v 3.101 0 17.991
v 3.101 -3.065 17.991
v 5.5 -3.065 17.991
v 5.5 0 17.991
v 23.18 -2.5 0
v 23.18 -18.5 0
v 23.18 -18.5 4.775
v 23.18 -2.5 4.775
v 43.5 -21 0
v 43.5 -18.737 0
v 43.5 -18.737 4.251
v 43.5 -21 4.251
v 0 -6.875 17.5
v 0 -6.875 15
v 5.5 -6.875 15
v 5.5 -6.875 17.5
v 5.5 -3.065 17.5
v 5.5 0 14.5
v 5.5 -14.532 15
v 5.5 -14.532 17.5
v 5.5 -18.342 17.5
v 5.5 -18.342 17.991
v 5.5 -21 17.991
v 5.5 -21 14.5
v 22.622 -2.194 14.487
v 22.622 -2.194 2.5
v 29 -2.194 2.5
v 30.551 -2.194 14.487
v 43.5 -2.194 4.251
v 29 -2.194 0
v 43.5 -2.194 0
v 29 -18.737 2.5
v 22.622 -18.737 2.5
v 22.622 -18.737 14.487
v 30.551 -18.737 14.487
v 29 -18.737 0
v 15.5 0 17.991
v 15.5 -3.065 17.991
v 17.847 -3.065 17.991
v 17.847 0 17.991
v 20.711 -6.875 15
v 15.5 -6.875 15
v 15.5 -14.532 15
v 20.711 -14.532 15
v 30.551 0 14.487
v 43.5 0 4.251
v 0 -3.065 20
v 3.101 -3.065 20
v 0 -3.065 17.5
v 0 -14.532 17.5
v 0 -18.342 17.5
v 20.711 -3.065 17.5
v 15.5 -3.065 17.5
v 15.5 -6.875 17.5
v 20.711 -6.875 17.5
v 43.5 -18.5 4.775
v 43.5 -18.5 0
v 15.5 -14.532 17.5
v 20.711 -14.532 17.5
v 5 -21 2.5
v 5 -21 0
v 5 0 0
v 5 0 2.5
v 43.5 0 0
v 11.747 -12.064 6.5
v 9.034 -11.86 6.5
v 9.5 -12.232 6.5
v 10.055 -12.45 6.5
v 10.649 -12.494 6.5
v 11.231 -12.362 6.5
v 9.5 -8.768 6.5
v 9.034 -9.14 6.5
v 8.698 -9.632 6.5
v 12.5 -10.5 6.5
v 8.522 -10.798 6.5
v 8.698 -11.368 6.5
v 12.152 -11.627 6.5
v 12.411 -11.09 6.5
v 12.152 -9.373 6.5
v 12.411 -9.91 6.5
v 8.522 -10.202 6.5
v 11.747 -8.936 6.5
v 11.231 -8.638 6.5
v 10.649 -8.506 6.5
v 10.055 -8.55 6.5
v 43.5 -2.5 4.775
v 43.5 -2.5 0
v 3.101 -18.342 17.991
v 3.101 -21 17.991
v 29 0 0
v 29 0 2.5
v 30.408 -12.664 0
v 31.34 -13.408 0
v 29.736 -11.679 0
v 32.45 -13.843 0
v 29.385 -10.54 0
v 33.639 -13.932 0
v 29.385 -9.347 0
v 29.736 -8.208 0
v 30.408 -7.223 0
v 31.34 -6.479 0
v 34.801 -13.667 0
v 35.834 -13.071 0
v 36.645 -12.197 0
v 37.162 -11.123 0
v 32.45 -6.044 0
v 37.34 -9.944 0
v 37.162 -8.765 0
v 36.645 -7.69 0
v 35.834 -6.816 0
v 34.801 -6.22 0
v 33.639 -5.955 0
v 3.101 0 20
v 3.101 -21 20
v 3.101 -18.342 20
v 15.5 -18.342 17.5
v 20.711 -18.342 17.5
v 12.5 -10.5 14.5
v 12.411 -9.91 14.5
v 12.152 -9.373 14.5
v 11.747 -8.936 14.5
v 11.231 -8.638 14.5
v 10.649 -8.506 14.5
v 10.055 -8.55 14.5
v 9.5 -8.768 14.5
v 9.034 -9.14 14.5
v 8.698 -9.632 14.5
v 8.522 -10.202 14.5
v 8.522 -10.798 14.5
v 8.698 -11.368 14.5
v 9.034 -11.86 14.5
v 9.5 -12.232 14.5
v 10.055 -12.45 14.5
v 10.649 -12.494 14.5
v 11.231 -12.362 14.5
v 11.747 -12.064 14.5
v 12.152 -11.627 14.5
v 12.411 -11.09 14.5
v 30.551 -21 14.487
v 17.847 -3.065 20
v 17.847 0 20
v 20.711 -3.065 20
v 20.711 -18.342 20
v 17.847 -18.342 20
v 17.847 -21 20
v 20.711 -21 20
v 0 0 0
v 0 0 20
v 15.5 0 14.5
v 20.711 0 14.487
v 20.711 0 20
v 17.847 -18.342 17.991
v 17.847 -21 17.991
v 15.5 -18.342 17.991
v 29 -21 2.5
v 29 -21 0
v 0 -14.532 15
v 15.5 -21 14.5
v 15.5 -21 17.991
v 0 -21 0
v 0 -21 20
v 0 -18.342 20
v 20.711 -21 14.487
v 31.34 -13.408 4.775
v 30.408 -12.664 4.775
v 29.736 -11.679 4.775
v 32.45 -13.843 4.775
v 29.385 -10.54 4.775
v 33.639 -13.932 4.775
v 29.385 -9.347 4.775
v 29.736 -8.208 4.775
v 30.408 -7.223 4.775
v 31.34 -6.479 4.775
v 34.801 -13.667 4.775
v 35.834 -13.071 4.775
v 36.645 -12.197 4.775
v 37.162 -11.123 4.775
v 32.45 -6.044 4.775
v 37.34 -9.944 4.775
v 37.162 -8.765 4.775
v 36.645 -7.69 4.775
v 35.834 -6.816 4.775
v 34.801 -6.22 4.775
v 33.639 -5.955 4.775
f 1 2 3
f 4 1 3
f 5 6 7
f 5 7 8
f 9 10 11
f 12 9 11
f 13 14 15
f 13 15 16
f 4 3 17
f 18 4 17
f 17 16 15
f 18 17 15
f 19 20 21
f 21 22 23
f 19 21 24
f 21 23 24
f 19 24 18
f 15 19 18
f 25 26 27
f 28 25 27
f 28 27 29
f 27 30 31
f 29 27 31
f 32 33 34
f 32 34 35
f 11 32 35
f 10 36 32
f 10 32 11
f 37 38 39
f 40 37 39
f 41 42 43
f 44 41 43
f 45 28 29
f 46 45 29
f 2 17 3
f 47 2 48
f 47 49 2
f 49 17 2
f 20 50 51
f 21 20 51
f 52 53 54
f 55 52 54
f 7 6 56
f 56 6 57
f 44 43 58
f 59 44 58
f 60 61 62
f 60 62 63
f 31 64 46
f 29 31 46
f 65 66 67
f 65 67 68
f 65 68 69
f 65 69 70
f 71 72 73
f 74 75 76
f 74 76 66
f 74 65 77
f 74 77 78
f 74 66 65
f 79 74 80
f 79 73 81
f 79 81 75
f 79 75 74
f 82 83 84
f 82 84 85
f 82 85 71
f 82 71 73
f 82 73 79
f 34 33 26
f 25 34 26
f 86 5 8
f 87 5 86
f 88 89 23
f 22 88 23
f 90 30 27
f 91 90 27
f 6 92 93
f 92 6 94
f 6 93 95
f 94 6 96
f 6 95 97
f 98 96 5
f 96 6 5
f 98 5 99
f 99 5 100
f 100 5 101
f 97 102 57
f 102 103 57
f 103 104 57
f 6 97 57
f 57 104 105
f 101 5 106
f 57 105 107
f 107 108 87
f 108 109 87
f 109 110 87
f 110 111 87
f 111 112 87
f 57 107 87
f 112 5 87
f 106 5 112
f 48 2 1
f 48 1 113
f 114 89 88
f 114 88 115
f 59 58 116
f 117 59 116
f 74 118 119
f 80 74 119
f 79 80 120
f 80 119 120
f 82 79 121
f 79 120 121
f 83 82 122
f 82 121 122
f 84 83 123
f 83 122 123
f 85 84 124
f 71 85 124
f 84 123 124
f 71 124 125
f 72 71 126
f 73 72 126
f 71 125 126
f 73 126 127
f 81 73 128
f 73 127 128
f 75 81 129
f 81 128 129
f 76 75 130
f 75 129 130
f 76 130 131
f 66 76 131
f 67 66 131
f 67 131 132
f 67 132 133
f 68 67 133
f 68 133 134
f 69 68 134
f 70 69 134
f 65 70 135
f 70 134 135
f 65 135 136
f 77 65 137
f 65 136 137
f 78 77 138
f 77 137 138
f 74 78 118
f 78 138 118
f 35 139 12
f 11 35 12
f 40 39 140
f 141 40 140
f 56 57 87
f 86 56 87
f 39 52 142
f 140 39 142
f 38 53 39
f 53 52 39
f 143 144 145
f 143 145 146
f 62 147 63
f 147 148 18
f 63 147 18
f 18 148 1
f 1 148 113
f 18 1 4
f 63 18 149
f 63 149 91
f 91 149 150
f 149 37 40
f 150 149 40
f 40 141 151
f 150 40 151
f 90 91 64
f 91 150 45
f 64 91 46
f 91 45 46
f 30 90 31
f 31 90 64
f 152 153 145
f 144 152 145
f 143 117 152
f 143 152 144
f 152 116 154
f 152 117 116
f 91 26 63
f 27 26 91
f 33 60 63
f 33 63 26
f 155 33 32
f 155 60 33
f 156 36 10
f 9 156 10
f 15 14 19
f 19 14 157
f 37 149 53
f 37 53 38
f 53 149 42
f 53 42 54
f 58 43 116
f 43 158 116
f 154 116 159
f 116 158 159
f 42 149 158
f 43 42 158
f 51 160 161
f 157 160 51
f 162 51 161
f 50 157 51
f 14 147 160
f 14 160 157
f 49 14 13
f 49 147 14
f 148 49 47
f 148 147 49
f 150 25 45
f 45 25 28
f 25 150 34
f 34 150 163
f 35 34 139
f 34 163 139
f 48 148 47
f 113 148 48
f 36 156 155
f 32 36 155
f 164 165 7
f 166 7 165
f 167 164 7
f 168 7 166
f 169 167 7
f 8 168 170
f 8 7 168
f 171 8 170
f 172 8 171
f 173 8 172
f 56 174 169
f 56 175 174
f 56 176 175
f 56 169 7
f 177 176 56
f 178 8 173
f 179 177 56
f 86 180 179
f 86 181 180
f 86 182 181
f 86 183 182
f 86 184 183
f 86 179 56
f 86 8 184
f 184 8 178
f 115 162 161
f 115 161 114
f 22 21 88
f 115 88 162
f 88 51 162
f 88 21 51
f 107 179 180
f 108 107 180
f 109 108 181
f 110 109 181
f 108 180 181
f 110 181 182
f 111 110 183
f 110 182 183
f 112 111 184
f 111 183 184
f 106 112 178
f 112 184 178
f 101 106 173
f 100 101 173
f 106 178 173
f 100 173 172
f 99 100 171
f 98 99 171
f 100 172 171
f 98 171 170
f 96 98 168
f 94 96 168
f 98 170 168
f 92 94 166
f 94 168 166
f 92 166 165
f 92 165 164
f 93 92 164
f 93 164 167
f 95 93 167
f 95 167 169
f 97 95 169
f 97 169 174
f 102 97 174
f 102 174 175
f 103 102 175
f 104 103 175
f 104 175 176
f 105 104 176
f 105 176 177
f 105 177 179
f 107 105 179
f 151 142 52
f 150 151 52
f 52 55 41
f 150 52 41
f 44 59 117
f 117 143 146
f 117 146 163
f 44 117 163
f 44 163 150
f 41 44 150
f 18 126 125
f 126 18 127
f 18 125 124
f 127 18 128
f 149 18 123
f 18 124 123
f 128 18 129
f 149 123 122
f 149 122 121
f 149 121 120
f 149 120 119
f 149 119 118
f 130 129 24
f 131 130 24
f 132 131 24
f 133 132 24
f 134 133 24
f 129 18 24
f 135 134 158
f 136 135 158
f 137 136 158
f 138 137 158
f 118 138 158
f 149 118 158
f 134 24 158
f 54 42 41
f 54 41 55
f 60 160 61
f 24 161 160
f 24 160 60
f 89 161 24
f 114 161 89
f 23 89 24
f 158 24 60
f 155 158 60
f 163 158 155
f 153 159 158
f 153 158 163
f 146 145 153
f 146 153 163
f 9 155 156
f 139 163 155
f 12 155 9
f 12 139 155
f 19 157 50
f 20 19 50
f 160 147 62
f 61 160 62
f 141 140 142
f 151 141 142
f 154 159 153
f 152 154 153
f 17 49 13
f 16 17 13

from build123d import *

# Parameters (mm, degrees)
F0_W      = 43.5
F0_H      = 20
F1_DEPTH  = 21
F2_W      = 24
F2_H      = 2.5
F2_W_2    = 2.3986939639
F2_H_2    = 2.0085112005
F2_W_3    = 2.3467258811
F3_DEPTH  = 21.001
F5_DEPTH  = 21.001
F6_R      = 2
F7_DEPTH  = 8
F9_W      = 15.2769281747
F9_H      = 2.5
F10_DEPTH = 43.501
F11_W     = 7.6569281747
F11_H     = 2.5
F12_DEPTH = 43.501
F15_DEPTH = 21.001
F16_W     = 23.7473566085
F16_H     = 16.5431026835
F17_DEPTH = 25.4
F13_W     = 20.32
F13_H     = 16
F18_DEPTH = 4.7752
F8_R      = 4
F19_DEPTH = 74
F20_R     = 4
F21_DEPTH = 4.7762


# Not quite as in the source:
# - an extrude ends at something that could not be found from the text; its depth is read off the source's solid


with BuildPart() as f1:
    # F0 (on Front) → F1 (new body)
    with BuildSketch(Plane.XZ):
        with Locations((21.75, 10)):
            Rectangle(F0_W, F0_H)
    extrude(amount=F1_DEPTH)

    # F2 (on face) → F3 (cut, through all)
    with BuildSketch(Plane.XZ.offset(21)):
        Polygon((15.5, 20), (5.5, 20), (5.5, 17.9914887995), (5.5, 14.5), (15.5, 14.5), (15.5, 17.9914887995), align=None)
        with Locations((17, 1.25)):
            Rectangle(F2_W, F2_H)
        with Locations((4.3006530181, 18.9957443997)):
            Rectangle(F2_W_2, F2_H_2)
        with Locations((16.6733629405, 18.9957443997)):
            Rectangle(F2_W_3, F2_H_2)
    extrude(amount=-F3_DEPTH, mode=Mode.SUBTRACT)

    # F4 (on face) → F5 (cut, through all)
    with BuildSketch(Plane.XZ.offset(21)):
        Polygon((43.5, 20), (23.5762298107, 20), (43.5, 4.2507629842), align=None)
    extrude(amount=-F5_DEPTH, mode=Mode.SUBTRACT)

    # F6 (on face) → F7 (cut)
    with BuildSketch(Plane.XY.offset(14.5)):
        with Locations((10.5, -10.5)):
            Circle(F6_R)
    extrude(amount=-F7_DEPTH, mode=Mode.SUBTRACT)

    # F9 (on face) → F10 (cut, through all)
    with BuildSketch(Plane(origin=(0, 0, 0), x_dir=(0, -1, 0), z_dir=(-1, 0, 0))):
        with Locations((10.7036660069, 18.75)):
            Rectangle(F9_W, F9_H)
    extrude(amount=-F10_DEPTH, mode=Mode.SUBTRACT)

    # F11 (on face) → F12 (cut, through all)
    with BuildSketch(Plane(origin=(0, 0, 0), x_dir=(0, -1, 0), z_dir=(-1, 0, 0))):
        with Locations((10.7036660069, 16.25)):
            Rectangle(F11_W, F11_H)
    extrude(amount=-F12_DEPTH, mode=Mode.SUBTRACT)

    # F14 (on face) → F15 (cut, through all)
    with BuildSketch(Plane.XZ.offset(21)):
        Polygon((23.5762298107, 20), (20.7114778459, 20), (20.7114778459, 14.4868092611), (30.5507610328, 14.4868092611), align=None)
    extrude(amount=-F15_DEPTH, mode=Mode.SUBTRACT)

    # F16 (on Top) → F17 (cut)
    with BuildSketch(Plane.XY):
        with Locations((34.4953713939, -10.4653941235)):
            Rectangle(F16_W, F16_H)
    extrude(amount=F17_DEPTH, mode=Mode.SUBTRACT)

    # F8 (on face) → F19 (cut, through all)
    with BuildSketch(Plane(origin=(0, 0, 0), x_dir=(1, 0, 0), z_dir=(0, 0, -1))):
        with Locations((36.25, 10.5)):
            Circle(F8_R)
    extrude(amount=F19_DEPTH, mode=Mode.SUBTRACT)


with BuildPart() as f18:
    # F13 (on Top) → F18 (new body)
    with BuildSketch(Plane.XY):
        with Locations((33.34, -10.5)):
            Rectangle(F13_W, F13_H)
    extrude(amount=F18_DEPTH)

    # F20 (on face) → F21 (cut, through all)
    with BuildSketch(Plane.XY.offset(4.7752)):
        with Locations((33.34, -9.9435616285)):
            Circle(F20_R)
    extrude(amount=-F21_DEPTH, mode=Mode.SUBTRACT)


solid = Compound([f1.part, f18.part])
